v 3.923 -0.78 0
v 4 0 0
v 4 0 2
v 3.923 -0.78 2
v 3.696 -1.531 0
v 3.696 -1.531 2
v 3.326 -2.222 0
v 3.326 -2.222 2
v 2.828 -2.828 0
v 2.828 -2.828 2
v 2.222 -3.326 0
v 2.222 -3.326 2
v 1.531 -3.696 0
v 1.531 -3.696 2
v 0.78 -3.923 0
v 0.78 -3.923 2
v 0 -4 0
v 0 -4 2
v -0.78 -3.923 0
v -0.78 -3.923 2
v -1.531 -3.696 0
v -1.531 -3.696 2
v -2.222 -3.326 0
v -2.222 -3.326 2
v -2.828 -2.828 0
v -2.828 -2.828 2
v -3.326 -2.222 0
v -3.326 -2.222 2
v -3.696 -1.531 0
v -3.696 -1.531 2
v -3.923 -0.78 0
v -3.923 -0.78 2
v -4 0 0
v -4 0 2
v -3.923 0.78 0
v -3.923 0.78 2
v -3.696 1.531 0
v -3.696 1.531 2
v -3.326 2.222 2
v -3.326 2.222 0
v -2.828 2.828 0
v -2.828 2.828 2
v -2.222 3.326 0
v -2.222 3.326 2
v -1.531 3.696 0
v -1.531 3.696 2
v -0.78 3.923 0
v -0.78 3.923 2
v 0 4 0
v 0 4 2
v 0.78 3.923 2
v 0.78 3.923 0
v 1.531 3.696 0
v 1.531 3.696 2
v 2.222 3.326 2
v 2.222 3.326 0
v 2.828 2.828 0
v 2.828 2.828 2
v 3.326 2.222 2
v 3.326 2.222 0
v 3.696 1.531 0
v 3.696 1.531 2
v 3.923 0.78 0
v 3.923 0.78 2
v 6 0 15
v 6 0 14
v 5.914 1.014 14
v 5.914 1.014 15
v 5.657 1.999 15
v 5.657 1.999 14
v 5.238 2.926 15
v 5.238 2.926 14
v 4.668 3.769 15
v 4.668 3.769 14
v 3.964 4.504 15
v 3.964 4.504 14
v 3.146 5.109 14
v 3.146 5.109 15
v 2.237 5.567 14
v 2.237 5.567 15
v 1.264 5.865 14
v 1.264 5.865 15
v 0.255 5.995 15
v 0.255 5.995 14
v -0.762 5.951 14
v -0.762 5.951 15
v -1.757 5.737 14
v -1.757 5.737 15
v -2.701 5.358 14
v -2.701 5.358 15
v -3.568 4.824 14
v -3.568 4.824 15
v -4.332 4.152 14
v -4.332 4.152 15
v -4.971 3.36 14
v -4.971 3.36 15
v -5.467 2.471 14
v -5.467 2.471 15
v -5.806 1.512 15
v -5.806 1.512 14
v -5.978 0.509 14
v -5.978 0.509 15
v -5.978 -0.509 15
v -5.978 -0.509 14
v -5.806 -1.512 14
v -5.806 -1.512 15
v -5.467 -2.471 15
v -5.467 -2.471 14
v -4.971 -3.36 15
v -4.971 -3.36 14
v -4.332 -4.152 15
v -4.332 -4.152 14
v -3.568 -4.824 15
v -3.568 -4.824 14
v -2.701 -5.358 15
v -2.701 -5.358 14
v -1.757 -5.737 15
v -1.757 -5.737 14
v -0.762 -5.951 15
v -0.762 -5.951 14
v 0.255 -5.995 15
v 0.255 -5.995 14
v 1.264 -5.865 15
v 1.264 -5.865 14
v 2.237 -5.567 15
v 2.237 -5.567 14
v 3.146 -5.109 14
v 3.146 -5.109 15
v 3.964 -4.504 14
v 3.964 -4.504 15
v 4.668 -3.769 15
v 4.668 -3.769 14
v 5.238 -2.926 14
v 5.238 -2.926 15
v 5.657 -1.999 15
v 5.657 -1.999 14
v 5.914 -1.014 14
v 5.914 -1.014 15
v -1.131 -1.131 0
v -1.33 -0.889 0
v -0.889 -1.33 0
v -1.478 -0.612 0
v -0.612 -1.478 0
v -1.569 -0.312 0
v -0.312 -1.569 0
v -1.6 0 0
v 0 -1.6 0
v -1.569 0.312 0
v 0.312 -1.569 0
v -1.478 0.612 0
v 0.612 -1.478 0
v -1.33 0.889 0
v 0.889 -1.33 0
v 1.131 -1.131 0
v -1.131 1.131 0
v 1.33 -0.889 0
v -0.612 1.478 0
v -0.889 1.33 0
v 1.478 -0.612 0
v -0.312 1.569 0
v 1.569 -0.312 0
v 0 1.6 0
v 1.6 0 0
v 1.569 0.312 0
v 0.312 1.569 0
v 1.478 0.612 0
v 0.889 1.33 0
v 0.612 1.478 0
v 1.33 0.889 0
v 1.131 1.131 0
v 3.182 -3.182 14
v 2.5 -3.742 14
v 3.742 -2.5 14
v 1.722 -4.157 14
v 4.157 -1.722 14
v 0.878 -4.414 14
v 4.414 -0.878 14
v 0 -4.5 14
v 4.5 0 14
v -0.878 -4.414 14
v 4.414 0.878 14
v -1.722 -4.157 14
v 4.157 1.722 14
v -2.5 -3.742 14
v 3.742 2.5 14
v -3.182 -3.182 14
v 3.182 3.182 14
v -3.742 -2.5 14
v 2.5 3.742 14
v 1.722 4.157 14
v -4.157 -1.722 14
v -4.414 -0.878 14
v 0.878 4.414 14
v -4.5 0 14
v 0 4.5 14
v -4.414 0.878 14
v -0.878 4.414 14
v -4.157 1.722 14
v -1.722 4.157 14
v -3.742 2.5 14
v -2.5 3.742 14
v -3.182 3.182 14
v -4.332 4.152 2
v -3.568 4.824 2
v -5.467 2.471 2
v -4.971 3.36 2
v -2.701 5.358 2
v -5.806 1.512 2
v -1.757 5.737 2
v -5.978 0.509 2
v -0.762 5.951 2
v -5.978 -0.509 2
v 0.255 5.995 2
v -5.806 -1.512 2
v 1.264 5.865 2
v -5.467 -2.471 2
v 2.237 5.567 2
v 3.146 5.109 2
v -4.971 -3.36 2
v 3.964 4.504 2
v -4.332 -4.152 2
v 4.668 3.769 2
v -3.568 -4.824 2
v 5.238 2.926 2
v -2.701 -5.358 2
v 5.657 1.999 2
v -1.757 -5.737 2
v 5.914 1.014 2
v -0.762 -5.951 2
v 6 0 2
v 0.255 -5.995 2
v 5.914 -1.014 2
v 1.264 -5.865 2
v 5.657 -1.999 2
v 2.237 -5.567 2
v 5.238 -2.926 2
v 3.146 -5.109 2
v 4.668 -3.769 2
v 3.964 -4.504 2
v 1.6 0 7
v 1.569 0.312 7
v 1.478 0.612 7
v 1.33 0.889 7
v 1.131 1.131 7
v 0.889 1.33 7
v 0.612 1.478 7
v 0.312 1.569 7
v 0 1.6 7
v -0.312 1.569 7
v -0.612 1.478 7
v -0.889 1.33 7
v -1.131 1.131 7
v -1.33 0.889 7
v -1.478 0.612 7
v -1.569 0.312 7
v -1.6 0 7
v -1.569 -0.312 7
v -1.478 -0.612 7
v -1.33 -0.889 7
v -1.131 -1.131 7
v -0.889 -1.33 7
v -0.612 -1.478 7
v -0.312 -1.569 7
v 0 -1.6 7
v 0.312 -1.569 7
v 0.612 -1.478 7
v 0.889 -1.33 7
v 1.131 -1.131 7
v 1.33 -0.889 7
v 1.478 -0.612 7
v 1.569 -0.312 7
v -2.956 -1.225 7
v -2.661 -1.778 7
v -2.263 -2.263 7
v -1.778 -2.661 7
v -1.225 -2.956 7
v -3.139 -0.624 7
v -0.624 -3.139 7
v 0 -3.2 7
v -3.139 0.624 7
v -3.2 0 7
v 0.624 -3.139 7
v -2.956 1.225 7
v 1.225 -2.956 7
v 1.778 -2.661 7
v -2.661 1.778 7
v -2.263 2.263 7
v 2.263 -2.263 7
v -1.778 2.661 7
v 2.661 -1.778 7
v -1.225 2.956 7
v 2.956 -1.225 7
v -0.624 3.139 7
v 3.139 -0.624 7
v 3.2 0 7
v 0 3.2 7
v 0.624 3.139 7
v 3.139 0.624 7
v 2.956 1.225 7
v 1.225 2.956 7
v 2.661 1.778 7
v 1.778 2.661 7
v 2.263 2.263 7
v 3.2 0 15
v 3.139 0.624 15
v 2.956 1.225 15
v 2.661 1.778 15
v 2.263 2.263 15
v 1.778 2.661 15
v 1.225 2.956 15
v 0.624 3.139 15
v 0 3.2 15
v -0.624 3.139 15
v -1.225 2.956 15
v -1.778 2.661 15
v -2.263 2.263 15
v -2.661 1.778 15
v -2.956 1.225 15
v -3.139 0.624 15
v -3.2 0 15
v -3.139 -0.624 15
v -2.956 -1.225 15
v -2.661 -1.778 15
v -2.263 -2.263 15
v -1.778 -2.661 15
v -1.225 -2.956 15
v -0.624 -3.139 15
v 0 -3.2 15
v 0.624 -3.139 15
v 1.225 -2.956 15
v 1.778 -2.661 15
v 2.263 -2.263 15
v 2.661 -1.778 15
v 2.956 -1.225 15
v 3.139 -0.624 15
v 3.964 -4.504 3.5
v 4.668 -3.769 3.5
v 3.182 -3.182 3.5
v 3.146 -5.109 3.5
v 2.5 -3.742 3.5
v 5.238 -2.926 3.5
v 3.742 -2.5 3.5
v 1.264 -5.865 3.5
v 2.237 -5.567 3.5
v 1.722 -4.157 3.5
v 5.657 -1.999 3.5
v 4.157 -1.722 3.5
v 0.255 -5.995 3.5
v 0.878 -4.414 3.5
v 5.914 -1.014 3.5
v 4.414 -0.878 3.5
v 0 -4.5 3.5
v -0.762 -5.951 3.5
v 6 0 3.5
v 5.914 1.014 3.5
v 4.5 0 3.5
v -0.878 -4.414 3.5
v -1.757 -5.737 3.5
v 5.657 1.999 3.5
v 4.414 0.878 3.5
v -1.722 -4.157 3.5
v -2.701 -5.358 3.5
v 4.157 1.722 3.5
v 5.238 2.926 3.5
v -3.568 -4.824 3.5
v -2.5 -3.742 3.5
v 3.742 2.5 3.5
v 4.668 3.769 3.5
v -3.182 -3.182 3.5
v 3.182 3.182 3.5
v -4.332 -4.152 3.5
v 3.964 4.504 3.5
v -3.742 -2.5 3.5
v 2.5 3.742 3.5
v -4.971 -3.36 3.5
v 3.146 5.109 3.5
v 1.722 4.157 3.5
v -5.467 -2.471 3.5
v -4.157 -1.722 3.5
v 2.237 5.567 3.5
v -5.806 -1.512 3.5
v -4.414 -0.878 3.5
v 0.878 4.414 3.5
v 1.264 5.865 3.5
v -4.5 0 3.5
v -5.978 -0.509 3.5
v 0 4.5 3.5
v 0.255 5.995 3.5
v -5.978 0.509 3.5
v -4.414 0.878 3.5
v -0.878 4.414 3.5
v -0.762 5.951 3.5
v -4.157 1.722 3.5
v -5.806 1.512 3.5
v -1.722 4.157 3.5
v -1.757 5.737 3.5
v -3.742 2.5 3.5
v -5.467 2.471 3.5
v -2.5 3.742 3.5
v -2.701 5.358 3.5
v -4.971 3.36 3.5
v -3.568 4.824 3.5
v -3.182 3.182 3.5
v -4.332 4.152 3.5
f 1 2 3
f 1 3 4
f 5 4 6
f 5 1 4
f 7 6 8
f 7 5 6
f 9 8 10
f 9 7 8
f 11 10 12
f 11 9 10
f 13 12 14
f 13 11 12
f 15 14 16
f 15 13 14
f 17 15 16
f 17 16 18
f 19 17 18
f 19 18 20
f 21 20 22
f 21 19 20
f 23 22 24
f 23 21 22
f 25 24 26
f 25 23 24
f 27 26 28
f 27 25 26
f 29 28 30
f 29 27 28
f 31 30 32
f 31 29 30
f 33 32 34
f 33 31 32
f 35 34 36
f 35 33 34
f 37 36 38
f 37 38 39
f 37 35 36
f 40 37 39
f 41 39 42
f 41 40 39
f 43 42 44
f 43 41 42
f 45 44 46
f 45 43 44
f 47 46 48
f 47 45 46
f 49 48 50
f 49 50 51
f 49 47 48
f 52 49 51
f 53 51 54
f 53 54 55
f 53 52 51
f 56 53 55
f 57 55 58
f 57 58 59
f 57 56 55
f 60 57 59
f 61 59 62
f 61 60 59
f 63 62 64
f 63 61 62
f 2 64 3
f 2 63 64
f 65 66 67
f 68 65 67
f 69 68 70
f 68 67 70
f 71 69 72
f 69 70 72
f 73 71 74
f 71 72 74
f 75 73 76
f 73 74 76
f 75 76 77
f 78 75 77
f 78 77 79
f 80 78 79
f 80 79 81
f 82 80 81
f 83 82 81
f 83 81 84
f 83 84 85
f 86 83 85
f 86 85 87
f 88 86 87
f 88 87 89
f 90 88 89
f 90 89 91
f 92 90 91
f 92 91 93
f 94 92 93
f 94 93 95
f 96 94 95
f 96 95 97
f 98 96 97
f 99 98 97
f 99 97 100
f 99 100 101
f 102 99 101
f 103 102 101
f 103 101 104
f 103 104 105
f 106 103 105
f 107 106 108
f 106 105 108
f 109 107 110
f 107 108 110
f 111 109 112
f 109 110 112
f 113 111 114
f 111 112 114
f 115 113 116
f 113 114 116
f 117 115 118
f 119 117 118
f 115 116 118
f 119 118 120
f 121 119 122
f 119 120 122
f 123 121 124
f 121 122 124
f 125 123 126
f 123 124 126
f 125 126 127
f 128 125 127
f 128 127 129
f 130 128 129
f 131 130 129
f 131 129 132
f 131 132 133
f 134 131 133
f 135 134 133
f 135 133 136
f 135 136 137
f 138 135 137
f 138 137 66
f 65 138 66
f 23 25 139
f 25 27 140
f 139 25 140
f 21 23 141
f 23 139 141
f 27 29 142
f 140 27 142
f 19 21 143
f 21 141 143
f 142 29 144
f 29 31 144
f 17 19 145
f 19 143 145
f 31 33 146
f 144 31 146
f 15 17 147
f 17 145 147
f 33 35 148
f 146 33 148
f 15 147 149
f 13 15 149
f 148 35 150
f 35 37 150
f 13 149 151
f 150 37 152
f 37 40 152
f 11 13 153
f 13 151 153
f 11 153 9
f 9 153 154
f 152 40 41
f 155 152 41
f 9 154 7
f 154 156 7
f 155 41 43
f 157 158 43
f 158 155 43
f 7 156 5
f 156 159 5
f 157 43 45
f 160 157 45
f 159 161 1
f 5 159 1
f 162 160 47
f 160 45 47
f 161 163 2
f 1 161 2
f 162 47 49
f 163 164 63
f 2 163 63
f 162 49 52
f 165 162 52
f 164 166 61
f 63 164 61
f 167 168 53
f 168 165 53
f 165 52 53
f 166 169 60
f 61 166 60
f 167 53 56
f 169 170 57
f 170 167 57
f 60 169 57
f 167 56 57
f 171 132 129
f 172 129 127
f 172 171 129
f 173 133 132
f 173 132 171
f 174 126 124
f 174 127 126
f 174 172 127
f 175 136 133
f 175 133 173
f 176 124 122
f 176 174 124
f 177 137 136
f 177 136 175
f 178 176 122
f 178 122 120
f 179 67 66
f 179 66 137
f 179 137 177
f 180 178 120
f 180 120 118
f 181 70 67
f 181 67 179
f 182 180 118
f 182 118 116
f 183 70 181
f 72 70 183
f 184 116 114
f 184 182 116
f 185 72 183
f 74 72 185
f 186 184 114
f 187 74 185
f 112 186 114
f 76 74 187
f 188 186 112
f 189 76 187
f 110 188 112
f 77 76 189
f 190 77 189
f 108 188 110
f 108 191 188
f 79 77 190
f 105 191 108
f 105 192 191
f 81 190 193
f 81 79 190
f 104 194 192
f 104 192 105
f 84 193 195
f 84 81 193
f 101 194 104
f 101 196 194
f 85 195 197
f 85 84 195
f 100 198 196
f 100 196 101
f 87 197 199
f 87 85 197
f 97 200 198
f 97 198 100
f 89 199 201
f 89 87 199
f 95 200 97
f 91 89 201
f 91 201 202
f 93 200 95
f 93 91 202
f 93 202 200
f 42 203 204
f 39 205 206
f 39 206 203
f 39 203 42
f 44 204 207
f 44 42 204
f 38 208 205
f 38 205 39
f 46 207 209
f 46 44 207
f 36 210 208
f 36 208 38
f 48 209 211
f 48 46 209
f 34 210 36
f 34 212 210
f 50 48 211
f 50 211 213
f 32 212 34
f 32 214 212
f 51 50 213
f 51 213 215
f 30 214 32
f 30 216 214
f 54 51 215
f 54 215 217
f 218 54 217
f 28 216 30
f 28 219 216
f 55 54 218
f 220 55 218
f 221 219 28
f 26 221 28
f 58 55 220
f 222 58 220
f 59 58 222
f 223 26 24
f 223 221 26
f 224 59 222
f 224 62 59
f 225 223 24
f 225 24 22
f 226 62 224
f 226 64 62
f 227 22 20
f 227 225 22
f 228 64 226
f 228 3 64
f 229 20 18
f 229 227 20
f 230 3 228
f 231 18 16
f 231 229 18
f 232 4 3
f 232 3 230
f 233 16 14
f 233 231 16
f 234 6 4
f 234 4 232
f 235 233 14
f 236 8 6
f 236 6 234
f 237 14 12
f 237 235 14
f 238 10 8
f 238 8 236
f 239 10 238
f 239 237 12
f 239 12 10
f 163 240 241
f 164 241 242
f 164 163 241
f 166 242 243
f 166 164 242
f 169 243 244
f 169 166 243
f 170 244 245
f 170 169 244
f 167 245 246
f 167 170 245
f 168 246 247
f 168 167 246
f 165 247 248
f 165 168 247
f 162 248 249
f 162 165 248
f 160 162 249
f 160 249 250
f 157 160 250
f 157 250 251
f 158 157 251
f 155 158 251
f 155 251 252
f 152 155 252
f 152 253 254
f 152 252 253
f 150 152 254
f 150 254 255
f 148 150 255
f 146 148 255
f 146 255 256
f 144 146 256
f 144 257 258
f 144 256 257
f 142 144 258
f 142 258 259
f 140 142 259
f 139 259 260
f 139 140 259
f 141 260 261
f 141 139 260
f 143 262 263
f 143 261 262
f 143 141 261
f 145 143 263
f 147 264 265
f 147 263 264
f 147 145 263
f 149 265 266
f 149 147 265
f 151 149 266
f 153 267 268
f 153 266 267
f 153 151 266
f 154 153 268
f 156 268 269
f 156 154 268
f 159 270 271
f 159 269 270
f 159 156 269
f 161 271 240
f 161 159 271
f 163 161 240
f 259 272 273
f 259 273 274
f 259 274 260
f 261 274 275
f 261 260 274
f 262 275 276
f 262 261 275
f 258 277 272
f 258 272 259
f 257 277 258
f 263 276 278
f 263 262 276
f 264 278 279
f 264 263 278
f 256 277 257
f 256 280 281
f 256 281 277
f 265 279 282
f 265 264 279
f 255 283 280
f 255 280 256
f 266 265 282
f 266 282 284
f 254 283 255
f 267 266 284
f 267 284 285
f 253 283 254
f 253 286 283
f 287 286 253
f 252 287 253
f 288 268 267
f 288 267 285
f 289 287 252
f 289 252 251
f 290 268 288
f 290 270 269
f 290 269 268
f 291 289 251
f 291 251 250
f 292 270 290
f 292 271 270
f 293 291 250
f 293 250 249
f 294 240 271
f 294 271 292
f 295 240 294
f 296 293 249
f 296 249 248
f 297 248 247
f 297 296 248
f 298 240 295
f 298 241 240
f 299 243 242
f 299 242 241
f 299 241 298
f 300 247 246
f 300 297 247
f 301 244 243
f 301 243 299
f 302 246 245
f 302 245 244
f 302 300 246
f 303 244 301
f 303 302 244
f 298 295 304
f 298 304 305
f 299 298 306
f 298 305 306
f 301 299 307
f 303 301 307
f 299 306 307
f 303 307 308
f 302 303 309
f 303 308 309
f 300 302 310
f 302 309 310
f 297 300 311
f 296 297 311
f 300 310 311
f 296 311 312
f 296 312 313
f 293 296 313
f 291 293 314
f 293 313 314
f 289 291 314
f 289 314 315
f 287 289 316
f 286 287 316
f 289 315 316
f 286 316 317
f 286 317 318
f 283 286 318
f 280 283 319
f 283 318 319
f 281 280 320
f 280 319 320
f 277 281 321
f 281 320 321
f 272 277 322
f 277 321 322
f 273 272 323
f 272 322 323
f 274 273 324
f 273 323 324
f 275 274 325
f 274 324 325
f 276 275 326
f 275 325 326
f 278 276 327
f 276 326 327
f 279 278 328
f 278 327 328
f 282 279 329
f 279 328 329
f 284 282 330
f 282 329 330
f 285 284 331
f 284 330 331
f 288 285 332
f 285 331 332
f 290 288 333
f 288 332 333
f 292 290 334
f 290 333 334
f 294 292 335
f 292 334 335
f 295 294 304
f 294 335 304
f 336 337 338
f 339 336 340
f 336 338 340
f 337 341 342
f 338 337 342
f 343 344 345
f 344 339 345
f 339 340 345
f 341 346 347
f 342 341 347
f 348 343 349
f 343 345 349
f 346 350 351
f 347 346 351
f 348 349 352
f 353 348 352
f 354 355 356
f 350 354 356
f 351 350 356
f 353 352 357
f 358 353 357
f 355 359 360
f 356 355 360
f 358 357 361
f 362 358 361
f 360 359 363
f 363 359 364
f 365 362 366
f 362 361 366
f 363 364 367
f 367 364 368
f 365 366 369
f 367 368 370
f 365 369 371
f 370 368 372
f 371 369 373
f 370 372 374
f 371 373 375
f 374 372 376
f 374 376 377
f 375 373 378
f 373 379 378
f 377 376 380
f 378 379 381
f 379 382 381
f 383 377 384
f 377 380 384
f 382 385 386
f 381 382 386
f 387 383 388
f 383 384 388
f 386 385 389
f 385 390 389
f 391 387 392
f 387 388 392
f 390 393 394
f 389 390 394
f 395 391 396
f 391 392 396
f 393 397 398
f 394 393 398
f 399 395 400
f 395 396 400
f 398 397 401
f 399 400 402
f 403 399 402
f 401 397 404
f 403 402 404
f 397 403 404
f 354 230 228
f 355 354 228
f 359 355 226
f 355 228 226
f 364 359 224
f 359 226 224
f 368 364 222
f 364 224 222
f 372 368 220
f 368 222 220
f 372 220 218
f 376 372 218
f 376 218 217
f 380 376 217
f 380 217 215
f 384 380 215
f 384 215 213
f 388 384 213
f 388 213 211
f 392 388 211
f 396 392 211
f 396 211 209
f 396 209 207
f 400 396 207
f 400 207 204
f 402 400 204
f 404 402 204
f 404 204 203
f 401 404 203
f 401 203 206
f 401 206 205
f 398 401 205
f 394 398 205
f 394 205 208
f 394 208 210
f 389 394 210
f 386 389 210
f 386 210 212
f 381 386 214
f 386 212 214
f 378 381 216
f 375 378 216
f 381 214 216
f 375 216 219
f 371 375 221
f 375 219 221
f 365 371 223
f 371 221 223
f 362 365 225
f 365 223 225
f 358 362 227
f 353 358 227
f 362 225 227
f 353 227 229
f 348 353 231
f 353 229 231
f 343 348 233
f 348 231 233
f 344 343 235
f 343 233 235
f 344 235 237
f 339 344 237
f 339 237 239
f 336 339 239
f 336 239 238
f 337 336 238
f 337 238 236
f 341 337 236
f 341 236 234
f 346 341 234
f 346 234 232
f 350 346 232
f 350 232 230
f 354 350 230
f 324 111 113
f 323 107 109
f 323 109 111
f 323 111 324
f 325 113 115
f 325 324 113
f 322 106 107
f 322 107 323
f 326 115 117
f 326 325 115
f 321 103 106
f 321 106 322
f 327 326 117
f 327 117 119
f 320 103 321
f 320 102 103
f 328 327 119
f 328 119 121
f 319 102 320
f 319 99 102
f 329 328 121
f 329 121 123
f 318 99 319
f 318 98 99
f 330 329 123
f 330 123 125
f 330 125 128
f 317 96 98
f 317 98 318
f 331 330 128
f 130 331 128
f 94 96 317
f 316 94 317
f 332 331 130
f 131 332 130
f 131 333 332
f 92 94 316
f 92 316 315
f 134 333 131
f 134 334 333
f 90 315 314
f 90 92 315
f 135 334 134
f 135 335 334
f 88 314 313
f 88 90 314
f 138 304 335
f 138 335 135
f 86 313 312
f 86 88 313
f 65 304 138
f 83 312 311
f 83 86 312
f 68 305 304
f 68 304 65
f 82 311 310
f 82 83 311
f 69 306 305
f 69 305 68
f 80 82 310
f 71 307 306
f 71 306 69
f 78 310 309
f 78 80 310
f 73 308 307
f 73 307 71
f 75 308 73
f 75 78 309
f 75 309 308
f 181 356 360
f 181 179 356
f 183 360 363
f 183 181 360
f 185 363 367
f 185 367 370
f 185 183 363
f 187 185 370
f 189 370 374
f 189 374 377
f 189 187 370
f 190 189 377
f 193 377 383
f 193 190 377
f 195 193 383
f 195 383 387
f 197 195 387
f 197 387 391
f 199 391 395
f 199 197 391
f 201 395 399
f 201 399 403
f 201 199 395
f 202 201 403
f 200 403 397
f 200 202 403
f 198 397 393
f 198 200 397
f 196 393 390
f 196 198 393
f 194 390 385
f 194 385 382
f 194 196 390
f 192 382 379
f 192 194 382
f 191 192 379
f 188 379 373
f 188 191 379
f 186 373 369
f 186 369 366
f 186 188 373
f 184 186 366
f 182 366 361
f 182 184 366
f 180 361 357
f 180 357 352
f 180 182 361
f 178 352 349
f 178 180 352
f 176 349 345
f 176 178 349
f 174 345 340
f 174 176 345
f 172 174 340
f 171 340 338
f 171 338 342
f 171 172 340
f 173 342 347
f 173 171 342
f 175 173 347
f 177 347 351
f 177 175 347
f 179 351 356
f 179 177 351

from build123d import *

# Parameters (mm, degrees)
SKETCH003_W     = 1.5
SKETCH003_H     = 10.5
SKETCH_R        = 6
SKETCH_R_2      = 1.6
PAD_DEPTH       = 15
SKETCH001_R     = 3.2
POCKET_DEPTH    = 8
SKETCH002_R     = 6
SKETCH002_R_2   = 4
POCKET001_DEPTH = 2


with BuildPart() as revolution:
    # Sketch003 → Revolution (revolve)
    with BuildSketch(Plane.XZ):
        with Locations((5.25, 8.75)):
            Rectangle(SKETCH003_W, SKETCH003_H)
    revolve(axis=Axis((0, 0, 0), (0, 0, 1)))


with BuildPart() as cut:
    # Sketch → Pad (new body)
    with BuildSketch(Plane.XY):
        Circle(SKETCH_R)
        Circle(SKETCH_R_2, mode=Mode.SUBTRACT)
    extrude(amount=PAD_DEPTH)

    # Sketch001 → Pocket (cut)
    with BuildSketch(Plane.XY.offset(15)):
        Circle(SKETCH001_R)
    extrude(amount=-POCKET_DEPTH, mode=Mode.SUBTRACT)

    # Sketch002 → Pocket001 (cut)
    with BuildSketch(Plane(origin=(0, 0, 0), x_dir=(1, 0, 0), z_dir=(0, 0, -1))):
        Circle(SKETCH002_R)
        Circle(SKETCH002_R_2, mode=Mode.SUBTRACT)
    extrude(amount=-POCKET001_DEPTH, mode=Mode.SUBTRACT)

    # Cut: cut Revolution
    add(revolution.part, mode=Mode.SUBTRACT)


solid = cut.part
